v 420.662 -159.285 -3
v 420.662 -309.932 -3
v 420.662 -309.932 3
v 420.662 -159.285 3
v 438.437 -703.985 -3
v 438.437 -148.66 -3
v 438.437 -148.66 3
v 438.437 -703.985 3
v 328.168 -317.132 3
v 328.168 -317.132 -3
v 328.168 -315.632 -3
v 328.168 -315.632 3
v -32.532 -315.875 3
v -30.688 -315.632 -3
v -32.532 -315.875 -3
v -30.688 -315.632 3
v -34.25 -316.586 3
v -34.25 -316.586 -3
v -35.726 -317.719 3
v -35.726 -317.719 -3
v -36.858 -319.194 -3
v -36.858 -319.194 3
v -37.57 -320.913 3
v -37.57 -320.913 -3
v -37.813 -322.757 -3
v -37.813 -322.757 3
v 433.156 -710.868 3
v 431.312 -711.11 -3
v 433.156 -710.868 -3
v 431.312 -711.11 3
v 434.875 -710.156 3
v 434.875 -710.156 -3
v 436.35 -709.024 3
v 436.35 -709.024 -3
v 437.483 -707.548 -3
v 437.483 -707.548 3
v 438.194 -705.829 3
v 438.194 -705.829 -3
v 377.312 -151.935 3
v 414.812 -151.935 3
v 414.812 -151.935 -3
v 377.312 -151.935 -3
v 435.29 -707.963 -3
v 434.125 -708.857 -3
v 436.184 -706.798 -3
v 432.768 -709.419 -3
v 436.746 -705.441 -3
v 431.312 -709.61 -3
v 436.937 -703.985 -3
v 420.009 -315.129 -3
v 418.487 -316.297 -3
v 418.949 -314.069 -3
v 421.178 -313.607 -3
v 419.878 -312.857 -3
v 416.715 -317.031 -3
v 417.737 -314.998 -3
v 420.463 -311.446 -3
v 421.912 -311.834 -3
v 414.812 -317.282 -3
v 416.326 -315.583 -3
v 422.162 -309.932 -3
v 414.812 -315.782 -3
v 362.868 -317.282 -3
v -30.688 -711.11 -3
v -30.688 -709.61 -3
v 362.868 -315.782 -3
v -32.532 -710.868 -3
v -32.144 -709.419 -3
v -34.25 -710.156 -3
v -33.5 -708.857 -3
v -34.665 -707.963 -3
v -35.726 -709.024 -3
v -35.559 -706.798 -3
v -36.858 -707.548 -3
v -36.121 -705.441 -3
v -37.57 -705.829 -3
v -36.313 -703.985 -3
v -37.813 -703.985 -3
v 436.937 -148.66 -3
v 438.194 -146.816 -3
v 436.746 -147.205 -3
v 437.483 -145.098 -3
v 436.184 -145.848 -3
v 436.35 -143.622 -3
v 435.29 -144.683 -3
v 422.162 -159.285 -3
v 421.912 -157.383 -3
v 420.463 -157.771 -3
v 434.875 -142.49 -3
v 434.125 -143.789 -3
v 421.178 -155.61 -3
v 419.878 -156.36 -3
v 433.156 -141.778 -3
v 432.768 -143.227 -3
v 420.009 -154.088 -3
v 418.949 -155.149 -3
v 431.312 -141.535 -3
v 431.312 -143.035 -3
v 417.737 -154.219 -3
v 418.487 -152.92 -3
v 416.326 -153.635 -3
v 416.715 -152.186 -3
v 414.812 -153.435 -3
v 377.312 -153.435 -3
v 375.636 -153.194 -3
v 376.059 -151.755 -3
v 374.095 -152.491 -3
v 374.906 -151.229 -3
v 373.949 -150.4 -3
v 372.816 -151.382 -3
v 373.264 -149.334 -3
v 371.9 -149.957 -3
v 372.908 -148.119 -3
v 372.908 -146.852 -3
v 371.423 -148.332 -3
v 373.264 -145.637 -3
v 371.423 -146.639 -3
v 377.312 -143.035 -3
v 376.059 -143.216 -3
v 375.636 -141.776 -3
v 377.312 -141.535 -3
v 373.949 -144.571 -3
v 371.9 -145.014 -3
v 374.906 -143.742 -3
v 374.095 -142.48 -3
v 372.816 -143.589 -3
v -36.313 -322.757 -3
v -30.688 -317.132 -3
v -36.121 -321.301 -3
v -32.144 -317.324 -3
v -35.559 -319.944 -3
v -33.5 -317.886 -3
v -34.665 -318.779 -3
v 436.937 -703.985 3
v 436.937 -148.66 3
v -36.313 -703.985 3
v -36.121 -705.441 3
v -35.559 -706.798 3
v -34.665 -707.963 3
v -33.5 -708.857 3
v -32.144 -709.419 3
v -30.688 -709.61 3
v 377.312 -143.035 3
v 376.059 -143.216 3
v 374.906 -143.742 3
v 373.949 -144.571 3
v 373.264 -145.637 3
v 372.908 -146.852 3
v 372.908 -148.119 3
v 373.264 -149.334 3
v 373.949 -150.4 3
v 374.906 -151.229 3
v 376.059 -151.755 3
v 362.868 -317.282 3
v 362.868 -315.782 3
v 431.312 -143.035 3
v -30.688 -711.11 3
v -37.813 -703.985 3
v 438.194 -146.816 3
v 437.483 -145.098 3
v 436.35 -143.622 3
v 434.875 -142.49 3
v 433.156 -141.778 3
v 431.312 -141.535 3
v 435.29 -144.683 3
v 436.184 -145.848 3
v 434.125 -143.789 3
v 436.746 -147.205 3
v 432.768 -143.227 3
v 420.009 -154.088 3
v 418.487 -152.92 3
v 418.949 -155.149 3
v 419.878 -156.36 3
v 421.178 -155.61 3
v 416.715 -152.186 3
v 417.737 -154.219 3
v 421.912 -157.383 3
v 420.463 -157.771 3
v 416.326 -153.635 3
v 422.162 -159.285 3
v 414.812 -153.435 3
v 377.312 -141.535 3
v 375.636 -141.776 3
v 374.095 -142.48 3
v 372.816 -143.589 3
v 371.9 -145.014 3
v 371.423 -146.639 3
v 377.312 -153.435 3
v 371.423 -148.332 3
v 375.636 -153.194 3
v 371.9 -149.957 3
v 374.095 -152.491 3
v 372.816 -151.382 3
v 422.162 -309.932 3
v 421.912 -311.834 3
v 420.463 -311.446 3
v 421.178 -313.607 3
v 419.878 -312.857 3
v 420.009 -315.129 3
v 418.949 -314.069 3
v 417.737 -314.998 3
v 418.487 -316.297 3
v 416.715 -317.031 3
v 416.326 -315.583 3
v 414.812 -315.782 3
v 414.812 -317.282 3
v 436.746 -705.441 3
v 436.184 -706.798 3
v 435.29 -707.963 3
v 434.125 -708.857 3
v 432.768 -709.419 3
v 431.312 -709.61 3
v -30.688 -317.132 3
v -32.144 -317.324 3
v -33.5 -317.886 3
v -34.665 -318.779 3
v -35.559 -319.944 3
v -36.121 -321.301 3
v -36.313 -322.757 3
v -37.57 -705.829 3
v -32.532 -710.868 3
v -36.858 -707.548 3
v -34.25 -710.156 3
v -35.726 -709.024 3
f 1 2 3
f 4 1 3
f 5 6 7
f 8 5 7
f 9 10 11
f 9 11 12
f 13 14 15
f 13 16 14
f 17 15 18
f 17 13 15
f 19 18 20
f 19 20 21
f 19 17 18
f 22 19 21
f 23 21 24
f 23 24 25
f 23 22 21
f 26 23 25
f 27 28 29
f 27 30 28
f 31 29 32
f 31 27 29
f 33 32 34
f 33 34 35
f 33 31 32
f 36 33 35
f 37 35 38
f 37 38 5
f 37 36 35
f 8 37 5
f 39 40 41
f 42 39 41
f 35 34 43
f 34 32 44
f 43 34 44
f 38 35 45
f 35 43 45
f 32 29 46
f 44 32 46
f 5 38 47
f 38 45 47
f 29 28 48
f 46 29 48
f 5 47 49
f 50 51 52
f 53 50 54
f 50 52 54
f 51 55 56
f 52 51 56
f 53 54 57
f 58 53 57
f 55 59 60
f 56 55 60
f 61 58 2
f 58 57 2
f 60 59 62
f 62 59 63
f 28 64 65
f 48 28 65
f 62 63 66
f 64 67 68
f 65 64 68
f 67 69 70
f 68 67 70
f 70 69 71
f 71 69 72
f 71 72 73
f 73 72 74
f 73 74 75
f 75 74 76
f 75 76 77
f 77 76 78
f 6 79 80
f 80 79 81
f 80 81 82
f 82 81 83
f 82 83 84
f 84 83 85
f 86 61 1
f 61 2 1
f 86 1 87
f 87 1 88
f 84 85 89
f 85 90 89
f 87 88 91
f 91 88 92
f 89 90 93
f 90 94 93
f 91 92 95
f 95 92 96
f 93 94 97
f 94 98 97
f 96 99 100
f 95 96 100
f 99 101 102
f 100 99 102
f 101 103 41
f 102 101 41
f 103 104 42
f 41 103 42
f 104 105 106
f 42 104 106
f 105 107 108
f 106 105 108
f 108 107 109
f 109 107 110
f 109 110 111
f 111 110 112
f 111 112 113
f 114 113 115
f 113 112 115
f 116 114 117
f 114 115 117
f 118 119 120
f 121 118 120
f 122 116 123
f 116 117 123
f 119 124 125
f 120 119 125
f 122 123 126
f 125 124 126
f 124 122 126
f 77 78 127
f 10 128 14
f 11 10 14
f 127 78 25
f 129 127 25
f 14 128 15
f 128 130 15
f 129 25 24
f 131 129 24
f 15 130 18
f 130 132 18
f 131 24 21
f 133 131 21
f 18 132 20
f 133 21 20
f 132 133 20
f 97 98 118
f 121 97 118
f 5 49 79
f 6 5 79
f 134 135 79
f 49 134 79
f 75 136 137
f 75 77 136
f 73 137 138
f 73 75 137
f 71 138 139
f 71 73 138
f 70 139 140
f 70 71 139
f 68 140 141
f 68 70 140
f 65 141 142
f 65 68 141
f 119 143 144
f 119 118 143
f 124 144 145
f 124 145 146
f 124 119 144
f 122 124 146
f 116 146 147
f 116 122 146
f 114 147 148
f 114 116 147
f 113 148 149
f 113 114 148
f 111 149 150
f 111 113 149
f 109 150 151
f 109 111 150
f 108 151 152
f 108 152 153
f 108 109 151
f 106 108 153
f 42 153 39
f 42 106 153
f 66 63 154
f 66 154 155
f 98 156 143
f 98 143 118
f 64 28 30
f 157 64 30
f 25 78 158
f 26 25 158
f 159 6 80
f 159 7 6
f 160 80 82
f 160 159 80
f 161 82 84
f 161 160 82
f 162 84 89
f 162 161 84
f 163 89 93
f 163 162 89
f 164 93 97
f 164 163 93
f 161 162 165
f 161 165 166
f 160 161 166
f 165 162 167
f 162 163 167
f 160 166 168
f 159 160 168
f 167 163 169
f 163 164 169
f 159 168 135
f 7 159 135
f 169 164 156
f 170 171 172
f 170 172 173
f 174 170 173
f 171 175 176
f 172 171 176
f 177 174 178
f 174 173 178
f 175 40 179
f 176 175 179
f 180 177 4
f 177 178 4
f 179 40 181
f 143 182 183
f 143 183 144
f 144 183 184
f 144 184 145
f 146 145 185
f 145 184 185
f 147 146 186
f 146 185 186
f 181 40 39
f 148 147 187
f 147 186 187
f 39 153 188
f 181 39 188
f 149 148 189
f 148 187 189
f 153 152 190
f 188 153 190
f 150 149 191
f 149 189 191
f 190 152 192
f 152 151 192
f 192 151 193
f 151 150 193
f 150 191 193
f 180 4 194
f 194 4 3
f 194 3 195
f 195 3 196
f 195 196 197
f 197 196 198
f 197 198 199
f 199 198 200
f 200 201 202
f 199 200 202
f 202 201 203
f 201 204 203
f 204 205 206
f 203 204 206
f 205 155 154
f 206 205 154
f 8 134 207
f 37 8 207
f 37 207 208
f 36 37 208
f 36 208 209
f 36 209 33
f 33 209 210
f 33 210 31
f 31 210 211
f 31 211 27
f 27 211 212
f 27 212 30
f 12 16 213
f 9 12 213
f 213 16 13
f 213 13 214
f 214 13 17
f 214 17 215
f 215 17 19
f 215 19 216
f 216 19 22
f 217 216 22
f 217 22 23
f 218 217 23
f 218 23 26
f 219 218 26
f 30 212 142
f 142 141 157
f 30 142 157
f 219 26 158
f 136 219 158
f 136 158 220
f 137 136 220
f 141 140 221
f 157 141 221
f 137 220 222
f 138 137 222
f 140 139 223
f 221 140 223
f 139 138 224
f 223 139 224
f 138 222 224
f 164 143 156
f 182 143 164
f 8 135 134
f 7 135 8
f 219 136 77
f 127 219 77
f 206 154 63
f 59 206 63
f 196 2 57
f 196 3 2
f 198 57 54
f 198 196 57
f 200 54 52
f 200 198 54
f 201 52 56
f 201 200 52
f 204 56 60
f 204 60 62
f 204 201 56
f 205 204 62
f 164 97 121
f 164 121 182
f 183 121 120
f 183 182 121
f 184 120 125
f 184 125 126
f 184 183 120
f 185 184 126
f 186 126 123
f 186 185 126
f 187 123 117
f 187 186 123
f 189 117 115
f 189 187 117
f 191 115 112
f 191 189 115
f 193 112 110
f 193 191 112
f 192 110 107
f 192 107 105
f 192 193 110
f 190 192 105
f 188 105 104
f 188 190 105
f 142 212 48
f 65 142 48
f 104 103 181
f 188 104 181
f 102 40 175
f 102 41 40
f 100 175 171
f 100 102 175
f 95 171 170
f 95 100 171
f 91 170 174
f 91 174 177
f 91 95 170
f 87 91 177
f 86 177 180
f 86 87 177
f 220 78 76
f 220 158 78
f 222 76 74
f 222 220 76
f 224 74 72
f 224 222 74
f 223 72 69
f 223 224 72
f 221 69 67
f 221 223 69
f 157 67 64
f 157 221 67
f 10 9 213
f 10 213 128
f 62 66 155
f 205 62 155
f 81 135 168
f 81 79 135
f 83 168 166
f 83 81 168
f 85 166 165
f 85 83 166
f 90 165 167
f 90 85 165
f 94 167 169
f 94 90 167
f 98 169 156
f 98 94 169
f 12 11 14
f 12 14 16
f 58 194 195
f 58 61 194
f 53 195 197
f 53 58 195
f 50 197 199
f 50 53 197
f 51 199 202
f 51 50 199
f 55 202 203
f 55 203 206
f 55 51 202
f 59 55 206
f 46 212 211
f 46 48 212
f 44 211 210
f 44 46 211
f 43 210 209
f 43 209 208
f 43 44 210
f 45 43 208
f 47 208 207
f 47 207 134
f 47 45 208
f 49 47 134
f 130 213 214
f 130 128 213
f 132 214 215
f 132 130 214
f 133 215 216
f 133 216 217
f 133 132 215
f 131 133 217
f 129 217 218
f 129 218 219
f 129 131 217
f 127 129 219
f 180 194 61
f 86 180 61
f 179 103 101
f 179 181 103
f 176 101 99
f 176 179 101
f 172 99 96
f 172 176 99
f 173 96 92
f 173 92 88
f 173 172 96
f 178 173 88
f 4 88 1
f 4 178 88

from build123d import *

# Parameters (mm, degrees)
SKETCH4_W = 6
SKETCH4_H = 1.5


with BuildPart() as part:
    # Sweep1: sweep along a path in Sketch1
    with BuildLine(Plane.XY) as sweep1_path:
        Line((328.167855181, -316.381930234), (-30.687774041, -316.381930234))
        ThreePointArc((-30.687774041, -316.381930234), (-35.195579771, -318.249124504), (-37.062774041, -322.756930234))
        Line((-37.062774041, -322.756930234), (-37.062774041, -703.985411885))
        ThreePointArc((-37.062774041, -703.985411885), (-35.195579771, -708.493217615), (-30.687774041, -710.360411885))
        Line((-30.687774041, -710.360411885), (431.312225959, -710.360411885))
        ThreePointArc((431.312225959, -710.360411885), (435.820031689, -708.493217615), (437.687225959, -703.985411885))
        Line((437.687225959, -703.985411885), (437.687225959, -148.660411885))
        ThreePointArc((437.687225959, -148.660411885), (435.820031689, -144.152606155), (431.312225959, -142.285411885))
        Line((431.312225959, -142.285411885), (377.312225959, -142.285411885))
        ThreePointArc((377.312225959, -142.285411885), (372.112225959, -147.485411885), (377.312225959, -152.685411885))
        Line((377.312225959, -152.685411885), (414.812225959, -152.685411885))
        ThreePointArc((414.812225959, -152.685411885), (419.479130714, -154.618507129), (421.412225959, -159.285411885))
        Line((421.412225959, -159.285411885), (421.412225959, -309.931930234))
        ThreePointArc((421.412225959, -309.931930234), (419.479130714, -314.59883499), (414.812225959, -316.531930234))
        Line((414.812225959, -316.531930234), (362.867855181, -316.531930234))
    # Sketch4 → Sweep1 (sweep)
    with BuildSketch(Plane(origin=(328.167855181, -316.381930234, 0), x_dir=(0, 0, -1), z_dir=(1, 0, 0))):
        Rectangle(SKETCH4_W, SKETCH4_H)
    sweep(path=sweep1_path.line)


solid = part.part
